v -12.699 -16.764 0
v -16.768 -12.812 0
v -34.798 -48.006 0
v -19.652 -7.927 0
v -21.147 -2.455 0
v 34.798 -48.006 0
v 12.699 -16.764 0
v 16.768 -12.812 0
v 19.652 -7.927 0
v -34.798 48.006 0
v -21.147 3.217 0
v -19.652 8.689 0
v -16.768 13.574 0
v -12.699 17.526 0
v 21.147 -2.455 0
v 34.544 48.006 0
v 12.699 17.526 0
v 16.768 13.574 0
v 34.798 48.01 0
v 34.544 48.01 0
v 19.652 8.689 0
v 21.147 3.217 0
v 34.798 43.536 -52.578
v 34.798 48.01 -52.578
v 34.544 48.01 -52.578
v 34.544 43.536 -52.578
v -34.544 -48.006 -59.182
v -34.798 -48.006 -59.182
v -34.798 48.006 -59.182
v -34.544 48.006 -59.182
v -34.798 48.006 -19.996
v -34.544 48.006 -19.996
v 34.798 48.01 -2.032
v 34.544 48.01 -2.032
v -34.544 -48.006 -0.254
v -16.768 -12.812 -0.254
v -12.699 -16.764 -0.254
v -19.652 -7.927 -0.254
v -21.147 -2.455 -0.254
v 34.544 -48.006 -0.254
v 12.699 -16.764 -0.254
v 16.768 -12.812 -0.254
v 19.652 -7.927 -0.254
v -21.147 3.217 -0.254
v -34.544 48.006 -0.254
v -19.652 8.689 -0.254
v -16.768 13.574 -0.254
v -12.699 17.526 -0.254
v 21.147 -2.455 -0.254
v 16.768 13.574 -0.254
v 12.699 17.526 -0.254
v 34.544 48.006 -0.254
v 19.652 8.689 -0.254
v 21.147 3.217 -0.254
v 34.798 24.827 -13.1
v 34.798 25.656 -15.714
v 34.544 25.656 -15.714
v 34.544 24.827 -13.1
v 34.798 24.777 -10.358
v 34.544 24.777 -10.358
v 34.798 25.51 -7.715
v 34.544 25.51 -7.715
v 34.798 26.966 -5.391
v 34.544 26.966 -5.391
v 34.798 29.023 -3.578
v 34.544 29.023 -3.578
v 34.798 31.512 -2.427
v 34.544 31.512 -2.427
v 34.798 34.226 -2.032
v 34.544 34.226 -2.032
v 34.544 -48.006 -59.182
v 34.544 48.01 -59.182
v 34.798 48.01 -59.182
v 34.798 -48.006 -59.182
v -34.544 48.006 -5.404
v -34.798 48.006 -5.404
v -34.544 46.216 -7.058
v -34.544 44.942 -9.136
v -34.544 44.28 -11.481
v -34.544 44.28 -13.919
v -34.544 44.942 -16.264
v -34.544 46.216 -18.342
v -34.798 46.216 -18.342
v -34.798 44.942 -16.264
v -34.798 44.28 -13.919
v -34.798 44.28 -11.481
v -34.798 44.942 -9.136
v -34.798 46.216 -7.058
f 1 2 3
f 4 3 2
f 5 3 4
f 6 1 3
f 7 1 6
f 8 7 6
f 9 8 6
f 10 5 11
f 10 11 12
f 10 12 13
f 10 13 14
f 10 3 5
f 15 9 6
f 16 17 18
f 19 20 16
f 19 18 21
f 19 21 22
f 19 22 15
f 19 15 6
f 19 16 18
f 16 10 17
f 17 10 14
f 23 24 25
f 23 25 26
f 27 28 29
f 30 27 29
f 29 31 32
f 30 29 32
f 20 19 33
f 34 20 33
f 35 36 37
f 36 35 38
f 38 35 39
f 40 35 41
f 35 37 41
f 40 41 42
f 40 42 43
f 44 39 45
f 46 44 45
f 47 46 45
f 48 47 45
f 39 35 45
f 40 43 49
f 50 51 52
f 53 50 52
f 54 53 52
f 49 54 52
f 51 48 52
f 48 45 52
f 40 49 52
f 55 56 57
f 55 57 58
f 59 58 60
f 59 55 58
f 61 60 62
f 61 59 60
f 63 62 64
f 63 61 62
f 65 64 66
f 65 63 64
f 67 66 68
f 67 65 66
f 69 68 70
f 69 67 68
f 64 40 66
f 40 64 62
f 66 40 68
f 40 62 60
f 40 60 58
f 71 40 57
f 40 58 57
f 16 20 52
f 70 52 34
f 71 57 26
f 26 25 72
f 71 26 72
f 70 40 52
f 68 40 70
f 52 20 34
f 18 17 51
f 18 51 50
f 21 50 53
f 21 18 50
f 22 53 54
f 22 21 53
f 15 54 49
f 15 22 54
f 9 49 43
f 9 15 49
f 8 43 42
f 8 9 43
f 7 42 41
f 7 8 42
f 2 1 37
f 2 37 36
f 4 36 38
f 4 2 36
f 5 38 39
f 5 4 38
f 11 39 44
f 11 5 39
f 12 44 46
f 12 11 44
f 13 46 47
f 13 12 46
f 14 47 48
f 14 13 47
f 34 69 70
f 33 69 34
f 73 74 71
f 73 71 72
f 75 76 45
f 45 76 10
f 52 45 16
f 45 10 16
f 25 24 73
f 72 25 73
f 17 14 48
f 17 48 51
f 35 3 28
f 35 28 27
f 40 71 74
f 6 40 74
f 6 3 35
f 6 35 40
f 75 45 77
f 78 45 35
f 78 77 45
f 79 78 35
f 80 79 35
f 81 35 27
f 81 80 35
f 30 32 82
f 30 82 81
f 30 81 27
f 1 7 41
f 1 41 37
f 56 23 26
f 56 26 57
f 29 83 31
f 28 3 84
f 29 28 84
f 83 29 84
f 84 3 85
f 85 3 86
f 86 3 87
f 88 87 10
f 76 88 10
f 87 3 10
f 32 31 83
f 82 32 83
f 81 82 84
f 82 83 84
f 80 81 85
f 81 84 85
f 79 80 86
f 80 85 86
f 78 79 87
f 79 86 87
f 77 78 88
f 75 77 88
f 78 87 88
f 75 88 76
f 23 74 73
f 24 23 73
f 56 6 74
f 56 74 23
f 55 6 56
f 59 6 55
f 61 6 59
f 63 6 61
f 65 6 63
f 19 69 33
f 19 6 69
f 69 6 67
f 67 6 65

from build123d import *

# Parameters (mm, degrees)
SKETCH1_W            = 69.596
SKETCH1_H            = 96.012
BOSS_EXTRUDE1_DEPTH  = 0.254
SKETCH3_W            = 69.596
SKETCH3_H            = 0.508
BOSS_EXTRUDE2_DEPTH  = 0.254
BOSS_EXTRUDE6_DEPTH  = 0.254
FILLET6_R            = 0.254
SKETCH8_W            = 59.182
SKETCH8_H            = 96.015557392
BOSS_EXTRUDE8_DEPTH  = 0.254
CUT_EXTRUDE1_DEPTH   = 0.254
SKETCH12_W           = 59.182
SKETCH12_H           = 96.012
BOSS_EXTRUDE10_DEPTH = 0.254
SKETCH13_R           = 8.89
CUT_EXTRUDE3_DEPTH   = 0.254
SKETCH24_W           = 13.836349518
SKETCH24_H           = 43.884642402
CUT_EXTRUDE5_DEPTH   = 104.203827287


with BuildPart() as part:
    # Sketch1 → Boss-Extrude1 (new body)
    with BuildSketch(Plane.XY):
        Rectangle(SKETCH1_W, SKETCH1_H)
        with BuildLine():
            Line((12.699364984, -16.764), (-12.699364984, -16.764))
            ThreePointArc((-12.699364984, -16.764), (-21.336, 0.381), (-12.699364984, 17.526))
            Line((-12.699364984, 17.526), (12.699364984, 17.526))
            ThreePointArc((12.699364984, 17.526), (21.336, 0.381), (12.699364984, -16.764))
        make_face(mode=Mode.SUBTRACT)
    extrude(amount=-BOSS_EXTRUDE1_DEPTH)

    # Sketch3 → Boss-Extrude2 (add)
    with BuildSketch(Plane.XY):
        with Locations((0, -17.272)):
            Rectangle(SKETCH3_W, SKETCH3_H)
    extrude(amount=BOSS_EXTRUDE2_DEPTH)

    # Sketch6 → Boss-Extrude6 (add)
    with BuildSketch(Plane.XY):
        with BuildLine():
            Line((14.986, -48.006), (15.24, -48.006))
            ThreePointArc((15.24, -48.006), (0, -32.766), (-15.24, -48.006))
            Line((-15.24, -48.006), (-14.986, -48.006))
            ThreePointArc((-14.986, -48.006), (0, -33.02), (14.986, -48.006))
        make_face()
    extrude(amount=BOSS_EXTRUDE6_DEPTH)

    # Fillet6
    # the kernel refuses this fillet: 0.254 mm, written as the material it takes off along each edge
    with BuildSketch(Plane(origin=(0, -48.006, 0.254), x_dir=(-0.9990995148781596, -0.04242828502574812, 0), z_dir=(0.04242828502574812, -0.9990995148781596, 0))) as fillet6_piece_1:
        with BuildLine():
            CenterArc((14.986 + FILLET6_R, FILLET6_R), FILLET6_R, 180, 90)
            Line((14.986 + FILLET6_R, 0), (14.986, 0))
            Line((14.986, 0), (14.986, FILLET6_R))
        make_face()
    revolve(axis=Axis((0, -48.006, 0.254), (0, 0, -1)), revolution_arc=184.863383217, mode=Mode.SUBTRACT)
    with BuildSketch(Plane(origin=(0, -48.006, 0.254), x_dir=(0.9991292765937022, -0.0417215610128061, 0), z_dir=(-0.0417215610128061, -0.9991292765937022, 0))) as fillet6_piece_2:
        with BuildLine():
            CenterArc((15.24 - FILLET6_R, -FILLET6_R), FILLET6_R, 0, 90)
            Line((15.24 - FILLET6_R, 0), (15.24, 0))
            Line((15.24, 0), (15.24, -FILLET6_R))
        make_face()
    revolve(axis=Axis((0, -48.006, 0.254), (0, 0, 1)), revolution_arc=184.78232683, mode=Mode.SUBTRACT)

    # Sketch8 → Boss-Extrude8 (add)
    with BuildSketch(Plane(origin=(34.798, 0, 0), x_dir=(0, 0, -1), z_dir=(1, 0, 0))):
        with Locations((29.591, 0.001778696)):
            Rectangle(SKETCH8_W, SKETCH8_H)
    extrude(amount=-BOSS_EXTRUDE8_DEPTH)

    # Sketch9 → Cut-Extrude1 (cut)
    with BuildSketch(Plane(origin=(34.798, 0, 0), x_dir=(0, 0, -1), z_dir=(1, 0, 0))):
        with BuildLine():
            Line((2.032, 34.225901784), (2.032, 48.009557392))
            Line((2.032, 48.009557392), (52.578, 48.009557392))
            Line((52.578, 48.009557392), (52.578, 43.536362147))
            Line((52.578, 43.536362147), (15.713824639, 25.655812291))
            ThreePointArc((15.713824639, 25.655812291), (6.500723192, 26.153746568), (2.032, 34.225901784))
        make_face()
    extrude(amount=-CUT_EXTRUDE1_DEPTH, mode=Mode.SUBTRACT)

    # Sketch12 → Boss-Extrude10 (add)
    with BuildSketch(Plane(origin=(-34.798, 0, 0), x_dir=(0, 0, -1), z_dir=(1, 0, 0))):
        with Locations((29.591, 0)):
            Rectangle(SKETCH12_W, SKETCH12_H)
    extrude(amount=BOSS_EXTRUDE10_DEPTH)

    # Sketch13 → Cut-Extrude3 (cut)
    with BuildSketch(Plane.ZY.offset(34.798)):
        with Locations((-12.7, 53.086)):
            Circle(SKETCH13_R)
    extrude(amount=-CUT_EXTRUDE3_DEPTH, mode=Mode.SUBTRACT)

    # Sketch24 → Cut-Extrude5 (cut, through all)
    with BuildSketch(Plane(origin=(34.798, 0, 0), x_dir=(0, 0, -1), z_dir=(1, 0, 0))):
        with Locations((-6.918174759, -26.063678799)):
            Rectangle(SKETCH24_W, SKETCH24_H)
    extrude(amount=-CUT_EXTRUDE5_DEPTH, mode=Mode.SUBTRACT)


solid = part.part
